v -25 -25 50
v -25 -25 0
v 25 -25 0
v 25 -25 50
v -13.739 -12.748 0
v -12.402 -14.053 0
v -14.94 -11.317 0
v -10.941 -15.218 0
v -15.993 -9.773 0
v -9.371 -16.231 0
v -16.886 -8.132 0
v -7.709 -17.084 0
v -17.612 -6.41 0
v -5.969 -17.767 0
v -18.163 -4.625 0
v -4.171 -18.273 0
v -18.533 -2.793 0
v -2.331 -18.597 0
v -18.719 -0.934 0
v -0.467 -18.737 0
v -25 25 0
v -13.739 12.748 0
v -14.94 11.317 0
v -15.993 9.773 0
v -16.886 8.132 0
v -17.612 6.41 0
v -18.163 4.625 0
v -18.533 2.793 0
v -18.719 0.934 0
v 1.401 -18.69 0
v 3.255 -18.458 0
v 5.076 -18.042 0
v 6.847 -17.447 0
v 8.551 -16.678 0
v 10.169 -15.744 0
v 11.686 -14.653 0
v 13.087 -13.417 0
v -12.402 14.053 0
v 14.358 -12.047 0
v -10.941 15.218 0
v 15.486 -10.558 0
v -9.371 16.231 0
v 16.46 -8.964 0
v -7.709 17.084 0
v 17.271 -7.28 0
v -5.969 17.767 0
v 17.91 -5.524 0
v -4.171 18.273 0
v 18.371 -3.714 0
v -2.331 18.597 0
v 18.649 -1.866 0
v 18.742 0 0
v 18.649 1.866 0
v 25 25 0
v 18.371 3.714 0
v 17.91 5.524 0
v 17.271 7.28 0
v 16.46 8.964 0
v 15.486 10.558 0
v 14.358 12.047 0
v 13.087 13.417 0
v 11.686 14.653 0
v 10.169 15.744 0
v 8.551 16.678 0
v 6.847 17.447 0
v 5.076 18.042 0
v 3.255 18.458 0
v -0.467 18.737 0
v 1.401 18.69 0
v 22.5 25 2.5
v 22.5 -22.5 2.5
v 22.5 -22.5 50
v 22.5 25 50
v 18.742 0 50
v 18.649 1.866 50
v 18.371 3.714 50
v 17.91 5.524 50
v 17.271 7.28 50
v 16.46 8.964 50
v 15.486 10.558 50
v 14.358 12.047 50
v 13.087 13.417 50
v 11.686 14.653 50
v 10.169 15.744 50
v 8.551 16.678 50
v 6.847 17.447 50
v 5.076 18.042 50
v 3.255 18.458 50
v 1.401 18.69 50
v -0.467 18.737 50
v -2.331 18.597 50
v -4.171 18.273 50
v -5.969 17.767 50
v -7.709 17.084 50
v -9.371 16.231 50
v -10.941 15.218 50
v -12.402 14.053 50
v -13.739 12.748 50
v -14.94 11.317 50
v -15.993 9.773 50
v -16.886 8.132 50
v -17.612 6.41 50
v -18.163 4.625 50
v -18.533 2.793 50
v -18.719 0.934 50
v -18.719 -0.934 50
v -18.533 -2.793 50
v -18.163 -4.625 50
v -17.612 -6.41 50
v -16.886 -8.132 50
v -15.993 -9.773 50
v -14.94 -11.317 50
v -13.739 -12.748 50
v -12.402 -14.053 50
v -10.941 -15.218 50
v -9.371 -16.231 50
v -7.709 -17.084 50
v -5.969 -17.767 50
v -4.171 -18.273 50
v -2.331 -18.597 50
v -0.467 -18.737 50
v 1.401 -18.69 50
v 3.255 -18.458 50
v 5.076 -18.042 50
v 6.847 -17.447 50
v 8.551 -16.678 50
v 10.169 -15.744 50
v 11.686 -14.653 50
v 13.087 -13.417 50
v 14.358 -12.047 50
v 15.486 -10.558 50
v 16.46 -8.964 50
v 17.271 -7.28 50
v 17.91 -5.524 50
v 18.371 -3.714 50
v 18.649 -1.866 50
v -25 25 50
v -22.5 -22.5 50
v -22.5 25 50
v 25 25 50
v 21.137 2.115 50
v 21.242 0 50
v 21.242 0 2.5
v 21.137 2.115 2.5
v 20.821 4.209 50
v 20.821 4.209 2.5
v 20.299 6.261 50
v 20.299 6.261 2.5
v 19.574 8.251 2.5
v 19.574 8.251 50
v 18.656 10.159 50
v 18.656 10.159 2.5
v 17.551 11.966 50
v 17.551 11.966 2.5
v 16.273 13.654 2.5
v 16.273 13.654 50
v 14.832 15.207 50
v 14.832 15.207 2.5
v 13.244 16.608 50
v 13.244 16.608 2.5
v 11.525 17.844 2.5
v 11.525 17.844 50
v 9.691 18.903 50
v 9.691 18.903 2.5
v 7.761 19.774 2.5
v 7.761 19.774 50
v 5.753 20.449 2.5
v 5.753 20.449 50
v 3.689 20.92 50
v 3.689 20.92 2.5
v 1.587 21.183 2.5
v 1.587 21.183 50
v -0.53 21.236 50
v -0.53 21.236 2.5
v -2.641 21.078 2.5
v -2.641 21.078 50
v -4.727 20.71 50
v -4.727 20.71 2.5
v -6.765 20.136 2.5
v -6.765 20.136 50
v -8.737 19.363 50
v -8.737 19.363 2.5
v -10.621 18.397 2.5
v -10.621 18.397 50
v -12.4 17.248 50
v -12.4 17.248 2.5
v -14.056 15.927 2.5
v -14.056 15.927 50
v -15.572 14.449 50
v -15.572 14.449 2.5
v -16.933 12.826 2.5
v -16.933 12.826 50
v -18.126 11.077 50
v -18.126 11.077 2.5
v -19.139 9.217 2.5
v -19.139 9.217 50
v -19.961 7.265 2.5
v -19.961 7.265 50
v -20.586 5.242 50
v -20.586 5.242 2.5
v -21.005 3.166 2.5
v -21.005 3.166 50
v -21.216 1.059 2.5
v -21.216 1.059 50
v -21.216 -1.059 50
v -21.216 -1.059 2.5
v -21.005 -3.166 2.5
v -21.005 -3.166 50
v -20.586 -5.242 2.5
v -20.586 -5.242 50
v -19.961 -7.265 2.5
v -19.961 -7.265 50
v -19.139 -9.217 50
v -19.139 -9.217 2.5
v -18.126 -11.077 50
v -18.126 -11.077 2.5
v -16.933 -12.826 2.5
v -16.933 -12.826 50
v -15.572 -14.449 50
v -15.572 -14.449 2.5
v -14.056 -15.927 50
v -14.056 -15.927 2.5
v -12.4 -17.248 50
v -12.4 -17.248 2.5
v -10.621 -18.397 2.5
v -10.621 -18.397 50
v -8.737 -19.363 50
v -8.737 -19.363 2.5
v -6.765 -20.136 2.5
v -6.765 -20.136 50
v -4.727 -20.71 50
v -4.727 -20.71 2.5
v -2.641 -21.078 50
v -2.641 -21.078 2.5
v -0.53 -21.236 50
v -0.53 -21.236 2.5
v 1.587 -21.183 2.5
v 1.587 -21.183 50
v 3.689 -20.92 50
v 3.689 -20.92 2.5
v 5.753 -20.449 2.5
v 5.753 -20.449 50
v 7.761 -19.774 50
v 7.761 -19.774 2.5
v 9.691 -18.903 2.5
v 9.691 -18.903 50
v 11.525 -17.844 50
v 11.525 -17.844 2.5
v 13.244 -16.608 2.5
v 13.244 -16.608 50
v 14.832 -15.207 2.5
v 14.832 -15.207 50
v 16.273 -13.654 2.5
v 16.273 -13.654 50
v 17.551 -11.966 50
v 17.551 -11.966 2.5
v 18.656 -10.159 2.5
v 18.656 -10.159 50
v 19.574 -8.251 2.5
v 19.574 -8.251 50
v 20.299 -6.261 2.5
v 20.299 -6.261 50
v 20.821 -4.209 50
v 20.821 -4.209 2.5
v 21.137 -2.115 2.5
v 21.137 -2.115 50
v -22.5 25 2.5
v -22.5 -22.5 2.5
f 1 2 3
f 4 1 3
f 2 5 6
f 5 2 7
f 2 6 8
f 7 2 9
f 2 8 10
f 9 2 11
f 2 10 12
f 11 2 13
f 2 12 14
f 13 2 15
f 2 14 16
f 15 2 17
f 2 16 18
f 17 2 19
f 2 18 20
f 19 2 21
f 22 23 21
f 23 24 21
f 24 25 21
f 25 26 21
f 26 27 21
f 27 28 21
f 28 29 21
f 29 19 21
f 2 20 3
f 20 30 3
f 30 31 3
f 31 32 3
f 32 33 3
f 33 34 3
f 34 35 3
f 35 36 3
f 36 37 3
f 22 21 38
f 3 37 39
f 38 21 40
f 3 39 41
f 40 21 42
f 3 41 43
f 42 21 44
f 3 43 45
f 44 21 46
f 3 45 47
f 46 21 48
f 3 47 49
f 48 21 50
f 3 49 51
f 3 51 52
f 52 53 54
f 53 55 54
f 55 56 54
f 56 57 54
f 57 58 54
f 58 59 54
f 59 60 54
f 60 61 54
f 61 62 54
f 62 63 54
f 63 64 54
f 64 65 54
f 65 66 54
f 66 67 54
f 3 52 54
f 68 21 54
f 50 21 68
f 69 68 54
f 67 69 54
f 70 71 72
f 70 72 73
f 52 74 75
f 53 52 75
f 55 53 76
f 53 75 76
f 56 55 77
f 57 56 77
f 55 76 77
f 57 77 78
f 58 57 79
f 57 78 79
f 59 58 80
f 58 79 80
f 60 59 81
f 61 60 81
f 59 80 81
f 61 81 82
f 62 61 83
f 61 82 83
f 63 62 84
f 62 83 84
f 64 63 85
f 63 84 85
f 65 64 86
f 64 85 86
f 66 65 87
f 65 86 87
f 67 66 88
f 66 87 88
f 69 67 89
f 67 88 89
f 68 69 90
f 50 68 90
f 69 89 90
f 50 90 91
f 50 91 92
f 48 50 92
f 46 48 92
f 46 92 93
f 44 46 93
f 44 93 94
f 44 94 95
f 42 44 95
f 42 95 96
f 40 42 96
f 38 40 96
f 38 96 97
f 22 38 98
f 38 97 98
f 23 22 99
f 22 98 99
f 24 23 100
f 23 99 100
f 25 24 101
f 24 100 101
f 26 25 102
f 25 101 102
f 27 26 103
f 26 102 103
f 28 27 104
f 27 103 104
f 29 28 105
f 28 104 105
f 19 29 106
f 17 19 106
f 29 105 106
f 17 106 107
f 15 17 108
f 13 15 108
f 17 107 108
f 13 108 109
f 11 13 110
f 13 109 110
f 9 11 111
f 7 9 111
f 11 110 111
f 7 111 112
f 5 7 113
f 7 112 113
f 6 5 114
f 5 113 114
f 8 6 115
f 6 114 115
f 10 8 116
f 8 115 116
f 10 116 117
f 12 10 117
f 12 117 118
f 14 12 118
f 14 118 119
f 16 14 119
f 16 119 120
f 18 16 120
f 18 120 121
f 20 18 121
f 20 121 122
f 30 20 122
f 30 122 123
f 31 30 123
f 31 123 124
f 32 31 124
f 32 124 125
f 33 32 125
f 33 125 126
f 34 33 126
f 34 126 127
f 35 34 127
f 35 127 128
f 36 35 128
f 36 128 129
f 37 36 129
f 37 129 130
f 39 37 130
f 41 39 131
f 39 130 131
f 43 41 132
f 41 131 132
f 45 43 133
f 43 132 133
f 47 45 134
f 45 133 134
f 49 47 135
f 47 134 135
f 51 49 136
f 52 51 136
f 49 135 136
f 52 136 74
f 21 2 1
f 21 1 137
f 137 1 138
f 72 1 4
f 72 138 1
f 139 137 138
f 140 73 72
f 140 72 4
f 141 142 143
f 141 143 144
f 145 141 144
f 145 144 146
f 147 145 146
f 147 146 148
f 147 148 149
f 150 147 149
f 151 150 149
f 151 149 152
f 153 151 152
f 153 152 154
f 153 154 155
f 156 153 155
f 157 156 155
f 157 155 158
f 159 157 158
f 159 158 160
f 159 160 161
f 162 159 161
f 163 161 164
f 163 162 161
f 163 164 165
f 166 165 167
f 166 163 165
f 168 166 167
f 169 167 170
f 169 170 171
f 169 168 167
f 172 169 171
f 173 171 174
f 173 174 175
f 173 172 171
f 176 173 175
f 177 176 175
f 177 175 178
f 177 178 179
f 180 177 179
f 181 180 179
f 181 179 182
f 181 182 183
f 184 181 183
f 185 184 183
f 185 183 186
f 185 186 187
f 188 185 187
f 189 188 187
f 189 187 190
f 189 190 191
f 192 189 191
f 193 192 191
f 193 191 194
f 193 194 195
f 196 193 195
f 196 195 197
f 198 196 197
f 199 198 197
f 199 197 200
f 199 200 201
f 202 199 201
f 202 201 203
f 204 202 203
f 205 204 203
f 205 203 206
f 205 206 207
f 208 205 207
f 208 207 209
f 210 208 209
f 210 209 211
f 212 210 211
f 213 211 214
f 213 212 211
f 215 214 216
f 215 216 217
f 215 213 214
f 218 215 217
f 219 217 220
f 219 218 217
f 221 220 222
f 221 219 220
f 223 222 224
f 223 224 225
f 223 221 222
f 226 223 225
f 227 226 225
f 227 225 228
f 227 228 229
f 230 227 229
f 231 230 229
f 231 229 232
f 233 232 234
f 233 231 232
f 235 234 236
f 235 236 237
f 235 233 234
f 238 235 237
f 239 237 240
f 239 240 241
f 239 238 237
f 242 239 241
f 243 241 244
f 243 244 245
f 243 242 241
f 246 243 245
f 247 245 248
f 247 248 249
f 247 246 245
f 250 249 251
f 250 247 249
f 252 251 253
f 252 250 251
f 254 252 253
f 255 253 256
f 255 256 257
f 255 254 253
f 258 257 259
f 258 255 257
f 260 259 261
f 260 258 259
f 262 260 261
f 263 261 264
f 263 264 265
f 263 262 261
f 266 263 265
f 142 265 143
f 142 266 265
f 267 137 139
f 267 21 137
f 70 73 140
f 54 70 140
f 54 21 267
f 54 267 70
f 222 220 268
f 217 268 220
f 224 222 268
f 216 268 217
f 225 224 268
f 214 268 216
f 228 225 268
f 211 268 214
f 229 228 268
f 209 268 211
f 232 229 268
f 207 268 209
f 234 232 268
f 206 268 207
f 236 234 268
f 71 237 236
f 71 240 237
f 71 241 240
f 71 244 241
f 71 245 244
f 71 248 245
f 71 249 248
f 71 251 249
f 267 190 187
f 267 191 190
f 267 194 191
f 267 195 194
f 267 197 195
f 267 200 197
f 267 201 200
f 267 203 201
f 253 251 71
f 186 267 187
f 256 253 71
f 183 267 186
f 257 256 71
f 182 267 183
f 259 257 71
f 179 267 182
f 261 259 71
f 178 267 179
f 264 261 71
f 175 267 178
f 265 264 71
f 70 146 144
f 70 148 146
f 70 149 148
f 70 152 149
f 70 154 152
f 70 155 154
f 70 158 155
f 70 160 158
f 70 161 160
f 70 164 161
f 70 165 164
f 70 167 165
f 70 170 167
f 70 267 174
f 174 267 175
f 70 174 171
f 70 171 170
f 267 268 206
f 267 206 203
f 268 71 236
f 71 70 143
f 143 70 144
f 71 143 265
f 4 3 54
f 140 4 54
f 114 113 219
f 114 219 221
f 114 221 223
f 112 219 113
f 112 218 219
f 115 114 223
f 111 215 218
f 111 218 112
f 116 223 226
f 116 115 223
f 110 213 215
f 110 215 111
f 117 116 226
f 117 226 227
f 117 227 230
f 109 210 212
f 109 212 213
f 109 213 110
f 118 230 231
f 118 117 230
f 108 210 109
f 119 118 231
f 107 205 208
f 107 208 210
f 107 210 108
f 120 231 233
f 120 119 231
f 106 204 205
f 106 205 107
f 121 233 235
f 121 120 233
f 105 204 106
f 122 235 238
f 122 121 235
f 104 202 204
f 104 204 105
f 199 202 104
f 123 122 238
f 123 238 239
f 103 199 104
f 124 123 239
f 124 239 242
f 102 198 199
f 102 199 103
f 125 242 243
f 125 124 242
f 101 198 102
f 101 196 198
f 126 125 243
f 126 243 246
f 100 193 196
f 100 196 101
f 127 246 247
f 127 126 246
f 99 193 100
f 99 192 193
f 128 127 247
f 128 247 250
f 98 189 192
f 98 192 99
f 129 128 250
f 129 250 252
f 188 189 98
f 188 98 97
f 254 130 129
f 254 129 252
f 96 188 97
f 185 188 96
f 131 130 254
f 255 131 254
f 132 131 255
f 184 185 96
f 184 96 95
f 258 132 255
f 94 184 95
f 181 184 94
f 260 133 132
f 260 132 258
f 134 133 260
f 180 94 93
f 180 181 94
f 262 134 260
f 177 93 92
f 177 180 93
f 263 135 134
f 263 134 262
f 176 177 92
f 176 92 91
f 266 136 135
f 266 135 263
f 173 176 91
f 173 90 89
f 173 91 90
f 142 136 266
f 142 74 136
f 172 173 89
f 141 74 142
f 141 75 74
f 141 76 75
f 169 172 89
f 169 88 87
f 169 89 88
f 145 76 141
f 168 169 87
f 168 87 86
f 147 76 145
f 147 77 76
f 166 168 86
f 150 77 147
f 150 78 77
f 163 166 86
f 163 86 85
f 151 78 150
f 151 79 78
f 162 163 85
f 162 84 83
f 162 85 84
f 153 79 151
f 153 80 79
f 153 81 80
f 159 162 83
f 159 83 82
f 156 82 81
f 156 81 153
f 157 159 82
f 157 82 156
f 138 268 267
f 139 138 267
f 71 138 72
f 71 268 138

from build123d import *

# Parameters (mm, degrees)
F0_W     = 50
F0_H     = 50
F1_DEPTH = 50
F2_R     = 18.7425
F3_DEPTH = 50
F4_T     = -2.5


with BuildPart() as f1:
    # F0 (on Top) → F1 (new body)
    with BuildSketch(Plane.XY):
        Rectangle(F0_W, F0_H)
    extrude(amount=F1_DEPTH)

    # F2 (on face) → F3 (cut)
    with BuildSketch(Plane.XY.offset(50)):
        Circle(F2_R)
    extrude(amount=-F3_DEPTH, mode=Mode.SUBTRACT)

    # F4
    f4_openings = [f1.faces().sort_by_distance(p)[0] for p in [
        (24.292893, 0, 50),
        (0, 25, 25),
    ]]
    offset(amount=F4_T, openings=f4_openings)


solid = f1.part
